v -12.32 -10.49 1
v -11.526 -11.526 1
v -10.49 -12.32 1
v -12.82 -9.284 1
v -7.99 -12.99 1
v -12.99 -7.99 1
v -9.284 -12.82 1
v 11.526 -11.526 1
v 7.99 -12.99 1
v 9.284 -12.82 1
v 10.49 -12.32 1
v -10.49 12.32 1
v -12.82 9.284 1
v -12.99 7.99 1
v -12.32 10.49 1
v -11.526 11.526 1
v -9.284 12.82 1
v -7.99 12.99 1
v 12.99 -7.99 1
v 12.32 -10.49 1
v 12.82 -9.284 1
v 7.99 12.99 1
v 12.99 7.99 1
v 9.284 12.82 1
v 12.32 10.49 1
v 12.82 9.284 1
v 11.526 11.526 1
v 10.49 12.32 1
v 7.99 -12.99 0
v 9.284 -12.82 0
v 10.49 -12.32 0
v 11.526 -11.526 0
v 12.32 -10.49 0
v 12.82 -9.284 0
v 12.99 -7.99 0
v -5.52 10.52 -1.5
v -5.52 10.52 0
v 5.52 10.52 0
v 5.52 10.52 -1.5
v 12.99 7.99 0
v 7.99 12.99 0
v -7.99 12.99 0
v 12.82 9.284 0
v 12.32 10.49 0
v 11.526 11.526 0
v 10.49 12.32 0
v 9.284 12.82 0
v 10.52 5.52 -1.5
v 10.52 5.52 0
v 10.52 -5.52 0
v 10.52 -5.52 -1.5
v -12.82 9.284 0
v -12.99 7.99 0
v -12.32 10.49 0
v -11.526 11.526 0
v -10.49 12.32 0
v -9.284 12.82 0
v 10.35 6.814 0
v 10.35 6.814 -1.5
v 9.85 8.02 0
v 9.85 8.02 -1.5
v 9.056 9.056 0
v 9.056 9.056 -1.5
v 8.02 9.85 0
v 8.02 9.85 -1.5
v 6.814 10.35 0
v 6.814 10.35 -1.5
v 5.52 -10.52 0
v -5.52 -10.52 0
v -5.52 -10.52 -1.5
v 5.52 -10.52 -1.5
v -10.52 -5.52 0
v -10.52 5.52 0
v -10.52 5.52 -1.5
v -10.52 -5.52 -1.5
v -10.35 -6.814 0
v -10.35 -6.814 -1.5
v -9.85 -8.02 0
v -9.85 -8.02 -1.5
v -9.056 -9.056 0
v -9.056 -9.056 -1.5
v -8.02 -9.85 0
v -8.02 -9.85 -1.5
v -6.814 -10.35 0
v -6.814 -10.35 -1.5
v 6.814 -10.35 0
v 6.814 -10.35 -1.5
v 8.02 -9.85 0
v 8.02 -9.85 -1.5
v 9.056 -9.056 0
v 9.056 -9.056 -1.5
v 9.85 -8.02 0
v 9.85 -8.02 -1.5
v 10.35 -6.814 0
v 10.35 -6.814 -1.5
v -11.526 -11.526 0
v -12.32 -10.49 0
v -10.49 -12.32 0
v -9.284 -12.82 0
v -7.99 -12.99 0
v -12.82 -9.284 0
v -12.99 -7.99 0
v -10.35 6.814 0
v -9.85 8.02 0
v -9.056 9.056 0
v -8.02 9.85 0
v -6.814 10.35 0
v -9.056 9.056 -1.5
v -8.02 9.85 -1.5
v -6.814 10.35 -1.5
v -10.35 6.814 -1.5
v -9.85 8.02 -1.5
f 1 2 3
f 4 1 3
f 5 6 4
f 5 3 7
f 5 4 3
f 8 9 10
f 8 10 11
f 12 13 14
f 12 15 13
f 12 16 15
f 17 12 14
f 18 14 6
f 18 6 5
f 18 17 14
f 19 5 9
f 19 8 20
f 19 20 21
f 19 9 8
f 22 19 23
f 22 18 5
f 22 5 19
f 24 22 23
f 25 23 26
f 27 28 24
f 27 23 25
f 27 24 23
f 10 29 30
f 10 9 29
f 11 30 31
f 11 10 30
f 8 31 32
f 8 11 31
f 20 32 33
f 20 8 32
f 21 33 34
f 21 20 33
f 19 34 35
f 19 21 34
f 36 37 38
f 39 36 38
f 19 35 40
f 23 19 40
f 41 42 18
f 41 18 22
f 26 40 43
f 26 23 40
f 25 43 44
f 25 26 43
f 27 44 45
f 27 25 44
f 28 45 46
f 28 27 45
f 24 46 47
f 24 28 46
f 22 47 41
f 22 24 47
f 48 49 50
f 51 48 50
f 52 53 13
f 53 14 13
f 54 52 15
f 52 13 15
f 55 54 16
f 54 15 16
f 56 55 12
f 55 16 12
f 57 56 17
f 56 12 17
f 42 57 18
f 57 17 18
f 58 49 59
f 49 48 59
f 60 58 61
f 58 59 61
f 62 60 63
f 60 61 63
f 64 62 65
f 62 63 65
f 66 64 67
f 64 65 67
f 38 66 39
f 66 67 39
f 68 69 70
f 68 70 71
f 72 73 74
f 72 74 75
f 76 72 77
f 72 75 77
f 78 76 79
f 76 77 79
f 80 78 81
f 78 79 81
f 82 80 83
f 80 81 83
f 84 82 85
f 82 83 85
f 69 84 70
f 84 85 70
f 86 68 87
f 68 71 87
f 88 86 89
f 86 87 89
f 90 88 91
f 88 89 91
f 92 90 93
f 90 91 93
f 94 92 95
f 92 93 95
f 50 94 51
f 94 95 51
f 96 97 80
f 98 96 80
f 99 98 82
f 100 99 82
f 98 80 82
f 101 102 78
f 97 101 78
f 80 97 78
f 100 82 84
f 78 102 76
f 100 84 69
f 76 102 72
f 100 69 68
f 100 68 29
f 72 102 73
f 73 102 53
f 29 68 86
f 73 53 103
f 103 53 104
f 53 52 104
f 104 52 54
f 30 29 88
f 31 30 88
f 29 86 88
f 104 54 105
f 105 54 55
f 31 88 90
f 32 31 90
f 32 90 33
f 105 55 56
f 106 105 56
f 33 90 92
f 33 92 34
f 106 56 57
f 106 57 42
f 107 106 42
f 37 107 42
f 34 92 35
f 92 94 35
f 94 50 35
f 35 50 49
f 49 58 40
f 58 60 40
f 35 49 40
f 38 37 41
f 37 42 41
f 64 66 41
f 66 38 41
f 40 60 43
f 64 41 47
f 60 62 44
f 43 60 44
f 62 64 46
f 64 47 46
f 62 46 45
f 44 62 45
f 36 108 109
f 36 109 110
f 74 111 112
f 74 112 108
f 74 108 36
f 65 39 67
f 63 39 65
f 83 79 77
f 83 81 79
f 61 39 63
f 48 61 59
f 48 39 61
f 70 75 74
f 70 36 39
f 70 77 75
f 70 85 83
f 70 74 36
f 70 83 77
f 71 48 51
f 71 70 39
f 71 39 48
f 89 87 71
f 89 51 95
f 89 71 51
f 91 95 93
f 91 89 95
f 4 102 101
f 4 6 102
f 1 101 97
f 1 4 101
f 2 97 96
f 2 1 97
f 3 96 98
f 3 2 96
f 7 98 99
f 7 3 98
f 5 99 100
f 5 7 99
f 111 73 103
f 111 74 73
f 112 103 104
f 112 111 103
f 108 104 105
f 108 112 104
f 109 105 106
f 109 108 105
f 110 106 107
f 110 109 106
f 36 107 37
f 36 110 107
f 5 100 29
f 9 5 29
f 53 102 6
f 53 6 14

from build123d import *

# Parameters (mm, degrees)
F0_W     = 25.98
F0_H     = 25.98
F1_DEPTH = 1
F2_R     = 5
F3_W     = 21.04
F3_H     = 21.04
F4_DEPTH = 1.5
F5_R     = 5


with BuildPart() as f1:
    # F0 (on Top) → F1 (new body)
    with BuildSketch(Plane.XY):
        Rectangle(F0_W, F0_H)
    extrude(amount=F1_DEPTH)

    # F2
    f2_edges = [f1.edges().sort_by_distance(p)[0] for p in [
        (-12.99, -12.99, 0.5),
        (12.99, -12.99, 0.5),
        (12.99, 12.99, 0.5),
        (-12.99, 12.99, 0.5),
    ]]
    fillet(f2_edges, radius=F2_R)

    # F3 (on face) → F4 (join)
    with BuildSketch(Plane(origin=(0, 0, 0), x_dir=(1, 0, 0), z_dir=(0, 0, -1))):
        Rectangle(F3_W, F3_H)
    extrude(amount=F4_DEPTH)

    # F5
    f5_edges = [f1.edges().sort_by_distance(p)[0] for p in [
        (10.52, -10.52, -0.75),
        (-10.52, -10.52, -0.75),
        (10.52, 10.52, -0.75),
        (-10.52, 10.52, -0.75),
    ]]
    fillet(f5_edges, radius=F5_R)


solid = f1.part
